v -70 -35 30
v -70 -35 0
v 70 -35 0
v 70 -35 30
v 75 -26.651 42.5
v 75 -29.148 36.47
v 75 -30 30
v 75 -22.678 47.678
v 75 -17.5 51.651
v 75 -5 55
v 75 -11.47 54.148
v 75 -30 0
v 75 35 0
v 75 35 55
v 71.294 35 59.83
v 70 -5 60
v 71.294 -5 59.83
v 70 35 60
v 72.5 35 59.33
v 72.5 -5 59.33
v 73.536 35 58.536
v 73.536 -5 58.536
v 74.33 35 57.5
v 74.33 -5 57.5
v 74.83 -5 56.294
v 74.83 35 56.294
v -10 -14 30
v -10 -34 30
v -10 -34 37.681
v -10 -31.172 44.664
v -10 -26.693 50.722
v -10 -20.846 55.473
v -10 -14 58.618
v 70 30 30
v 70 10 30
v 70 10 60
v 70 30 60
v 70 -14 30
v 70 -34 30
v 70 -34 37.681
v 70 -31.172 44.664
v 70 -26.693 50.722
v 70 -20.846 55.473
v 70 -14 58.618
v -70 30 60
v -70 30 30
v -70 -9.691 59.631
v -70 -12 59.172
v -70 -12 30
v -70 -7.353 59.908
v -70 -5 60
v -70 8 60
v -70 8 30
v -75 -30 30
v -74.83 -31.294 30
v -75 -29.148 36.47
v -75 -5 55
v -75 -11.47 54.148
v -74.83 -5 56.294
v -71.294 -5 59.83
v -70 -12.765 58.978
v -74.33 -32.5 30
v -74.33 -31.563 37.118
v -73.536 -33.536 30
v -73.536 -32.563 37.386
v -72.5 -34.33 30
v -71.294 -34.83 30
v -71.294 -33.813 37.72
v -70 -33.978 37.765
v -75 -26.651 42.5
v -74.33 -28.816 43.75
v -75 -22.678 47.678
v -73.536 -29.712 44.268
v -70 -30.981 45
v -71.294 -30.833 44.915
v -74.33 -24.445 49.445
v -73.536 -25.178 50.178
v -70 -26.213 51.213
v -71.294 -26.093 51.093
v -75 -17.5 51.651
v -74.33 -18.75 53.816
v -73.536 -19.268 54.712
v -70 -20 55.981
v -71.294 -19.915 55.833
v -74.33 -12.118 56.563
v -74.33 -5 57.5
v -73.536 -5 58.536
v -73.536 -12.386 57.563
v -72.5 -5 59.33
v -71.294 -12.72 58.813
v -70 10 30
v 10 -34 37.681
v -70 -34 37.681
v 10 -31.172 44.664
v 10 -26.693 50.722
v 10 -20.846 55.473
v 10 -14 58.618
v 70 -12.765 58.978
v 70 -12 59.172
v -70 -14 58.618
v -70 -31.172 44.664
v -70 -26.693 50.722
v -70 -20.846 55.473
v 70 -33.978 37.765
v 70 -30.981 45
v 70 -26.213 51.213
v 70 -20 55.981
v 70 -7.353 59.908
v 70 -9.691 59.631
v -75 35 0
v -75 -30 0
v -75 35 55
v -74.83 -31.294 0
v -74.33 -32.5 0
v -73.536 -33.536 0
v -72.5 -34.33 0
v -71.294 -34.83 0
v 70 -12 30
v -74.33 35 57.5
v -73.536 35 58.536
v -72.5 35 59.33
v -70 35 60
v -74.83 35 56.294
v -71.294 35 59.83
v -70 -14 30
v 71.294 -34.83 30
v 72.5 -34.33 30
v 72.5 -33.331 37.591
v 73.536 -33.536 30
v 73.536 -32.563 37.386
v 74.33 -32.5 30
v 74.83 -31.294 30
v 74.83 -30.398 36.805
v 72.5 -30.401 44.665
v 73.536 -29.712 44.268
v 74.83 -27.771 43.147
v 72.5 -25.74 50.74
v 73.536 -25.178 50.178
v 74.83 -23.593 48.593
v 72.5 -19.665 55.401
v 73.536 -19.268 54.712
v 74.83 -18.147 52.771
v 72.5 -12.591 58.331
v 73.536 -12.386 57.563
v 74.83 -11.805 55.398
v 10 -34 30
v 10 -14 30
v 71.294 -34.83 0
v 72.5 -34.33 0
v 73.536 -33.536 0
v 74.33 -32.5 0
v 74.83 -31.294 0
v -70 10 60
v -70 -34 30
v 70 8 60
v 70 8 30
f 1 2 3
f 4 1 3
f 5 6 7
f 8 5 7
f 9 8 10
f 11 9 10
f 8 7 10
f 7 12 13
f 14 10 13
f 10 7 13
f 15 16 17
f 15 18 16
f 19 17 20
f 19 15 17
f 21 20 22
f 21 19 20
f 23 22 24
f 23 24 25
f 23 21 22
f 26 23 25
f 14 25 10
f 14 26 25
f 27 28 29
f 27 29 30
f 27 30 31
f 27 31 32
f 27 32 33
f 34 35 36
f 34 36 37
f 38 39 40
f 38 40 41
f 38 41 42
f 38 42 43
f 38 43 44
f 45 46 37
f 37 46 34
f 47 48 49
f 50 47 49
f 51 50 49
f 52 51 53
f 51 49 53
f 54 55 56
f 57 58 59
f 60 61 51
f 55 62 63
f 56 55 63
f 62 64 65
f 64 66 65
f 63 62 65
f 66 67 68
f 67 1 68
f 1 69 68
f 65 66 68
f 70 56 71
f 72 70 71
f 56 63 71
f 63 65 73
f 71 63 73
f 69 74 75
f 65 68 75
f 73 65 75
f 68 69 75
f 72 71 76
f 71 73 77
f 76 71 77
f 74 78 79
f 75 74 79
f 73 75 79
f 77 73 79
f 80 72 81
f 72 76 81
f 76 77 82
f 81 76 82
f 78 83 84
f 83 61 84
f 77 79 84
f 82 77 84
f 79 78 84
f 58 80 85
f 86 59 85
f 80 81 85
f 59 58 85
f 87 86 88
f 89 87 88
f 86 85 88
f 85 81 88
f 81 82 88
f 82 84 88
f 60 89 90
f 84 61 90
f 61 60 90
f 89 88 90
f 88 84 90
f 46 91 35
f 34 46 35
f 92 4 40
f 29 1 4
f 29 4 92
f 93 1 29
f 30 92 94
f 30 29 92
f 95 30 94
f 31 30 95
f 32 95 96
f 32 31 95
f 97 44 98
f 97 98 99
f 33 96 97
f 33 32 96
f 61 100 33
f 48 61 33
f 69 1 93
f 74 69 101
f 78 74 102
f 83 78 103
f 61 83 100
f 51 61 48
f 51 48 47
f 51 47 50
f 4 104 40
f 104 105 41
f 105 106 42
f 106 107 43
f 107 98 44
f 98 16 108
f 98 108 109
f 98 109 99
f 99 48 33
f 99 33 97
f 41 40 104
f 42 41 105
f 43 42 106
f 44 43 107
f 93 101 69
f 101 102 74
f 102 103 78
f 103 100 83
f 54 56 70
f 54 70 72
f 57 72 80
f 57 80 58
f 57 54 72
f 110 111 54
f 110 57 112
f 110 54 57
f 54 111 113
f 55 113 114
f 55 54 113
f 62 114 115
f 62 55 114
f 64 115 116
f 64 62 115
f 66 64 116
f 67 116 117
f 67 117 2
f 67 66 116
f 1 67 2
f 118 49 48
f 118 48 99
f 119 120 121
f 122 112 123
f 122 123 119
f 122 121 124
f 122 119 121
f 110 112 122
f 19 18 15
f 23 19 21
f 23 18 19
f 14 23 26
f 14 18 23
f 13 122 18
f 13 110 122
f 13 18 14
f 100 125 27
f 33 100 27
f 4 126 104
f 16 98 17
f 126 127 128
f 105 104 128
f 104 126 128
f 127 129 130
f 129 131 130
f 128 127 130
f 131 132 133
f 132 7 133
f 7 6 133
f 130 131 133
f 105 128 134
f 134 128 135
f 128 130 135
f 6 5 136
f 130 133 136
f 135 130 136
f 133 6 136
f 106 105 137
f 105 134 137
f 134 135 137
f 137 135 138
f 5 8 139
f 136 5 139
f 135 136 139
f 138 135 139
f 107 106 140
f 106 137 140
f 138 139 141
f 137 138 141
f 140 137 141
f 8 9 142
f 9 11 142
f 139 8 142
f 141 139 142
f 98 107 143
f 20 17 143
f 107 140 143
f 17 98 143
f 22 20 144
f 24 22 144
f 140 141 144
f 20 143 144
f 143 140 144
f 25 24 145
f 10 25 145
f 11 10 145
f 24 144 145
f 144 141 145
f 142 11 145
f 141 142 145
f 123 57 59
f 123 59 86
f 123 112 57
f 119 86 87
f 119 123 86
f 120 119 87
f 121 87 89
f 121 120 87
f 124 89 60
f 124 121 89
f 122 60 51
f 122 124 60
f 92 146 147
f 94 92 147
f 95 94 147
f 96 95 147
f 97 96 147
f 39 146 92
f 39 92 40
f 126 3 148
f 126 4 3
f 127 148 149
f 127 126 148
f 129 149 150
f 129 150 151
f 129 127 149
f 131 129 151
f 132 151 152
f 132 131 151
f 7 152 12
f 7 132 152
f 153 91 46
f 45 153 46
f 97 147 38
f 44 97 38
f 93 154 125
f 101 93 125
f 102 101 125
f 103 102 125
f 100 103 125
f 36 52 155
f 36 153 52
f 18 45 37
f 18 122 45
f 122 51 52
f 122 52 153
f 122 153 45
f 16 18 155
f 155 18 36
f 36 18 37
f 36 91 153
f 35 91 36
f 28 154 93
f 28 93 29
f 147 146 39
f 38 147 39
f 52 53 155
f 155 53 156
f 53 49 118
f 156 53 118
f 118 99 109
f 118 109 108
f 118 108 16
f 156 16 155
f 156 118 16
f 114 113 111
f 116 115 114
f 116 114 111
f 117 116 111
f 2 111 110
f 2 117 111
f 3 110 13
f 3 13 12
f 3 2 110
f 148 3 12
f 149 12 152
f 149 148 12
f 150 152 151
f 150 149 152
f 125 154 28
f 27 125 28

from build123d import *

# Parameters (mm, degrees)
F0_W        = 150
F0_H        = 70
F0_W_2      = 60
F0_H_2      = 20
F0_W_3      = 140
F1_DEPTH    = 60
F2_T1_DEPTH = 300
F3_R        = 4.99999
F4_W        = 140
F4_H        = 20.1229466498
F4_H_2      = 20
F5_DEPTH    = 30


# Not quite as in the source:
# - a fillet or chamfer that OpenCascade refuses, or shapes differently, is made with other operations: its cross-section is extruded or revolved along the edge and cut away or added
# - a fillet or chamfer is up to 0.001 mm smaller than in the source, because OpenCascade refuses the exact size


with BuildPart() as f1:
    # F0 (on Top) → F1 (new body)
    with BuildSketch(Plane.XY):
        Rectangle(F0_W, F0_H)
        with Locations((-40, -24)):
            Rectangle(F0_W_2, F0_H_2, mode=Mode.SUBTRACT)
        with Locations((40, -24)):
            Rectangle(F0_W_2, F0_H_2, mode=Mode.SUBTRACT)
        with Locations((0, -2)):
            Rectangle(F0_W_3, F0_H_2, mode=Mode.SUBTRACT)
        with Locations((0, 20)):
            Rectangle(F0_W_3, F0_H_2, mode=Mode.SUBTRACT)
    extrude(amount=F1_DEPTH)

    # F2: fillet of radius 30 on 1 edges, made by hand

    # F2_s2 → F2_t1 (cut)
    with BuildSketch(Plane.YZ.offset(-150)):
        with BuildLine():
            ThreePointArc((-35, 30), (-26.2132034356, 51.2132034356), (-5, 60))
            Line((-5, 60), (-35, 60))
            Line((-35, 60), (-35, 30))
        make_face()
    extrude(amount=F2_T1_DEPTH, mode=Mode.SUBTRACT)

    # F3 (radius 5 in the source; OpenCascade refuses exactly that, so slightly less here)
    f3_edges = [f1.edges().sort_by_distance(p)[0] for p in [
        (75, 15, 60),
        (-75, 15, 60),
    ]]
    fillet(f3_edges, radius=F3_R)

    # F4 (on face) → F5 (join)
    with BuildSketch(Plane(origin=(0, 0, 0), x_dir=(1, 0, 0), z_dir=(0, 0, -1))):
        with Locations((0, -19.9385266751)):
            Rectangle(F4_W, F4_H)
        with Locations((0, 2)):
            Rectangle(F4_W, F4_H_2)
        with Locations((0, 24)):
            Rectangle(F4_W, F4_H_2)
    extrude(amount=-F5_DEPTH)


solid = f1.part
